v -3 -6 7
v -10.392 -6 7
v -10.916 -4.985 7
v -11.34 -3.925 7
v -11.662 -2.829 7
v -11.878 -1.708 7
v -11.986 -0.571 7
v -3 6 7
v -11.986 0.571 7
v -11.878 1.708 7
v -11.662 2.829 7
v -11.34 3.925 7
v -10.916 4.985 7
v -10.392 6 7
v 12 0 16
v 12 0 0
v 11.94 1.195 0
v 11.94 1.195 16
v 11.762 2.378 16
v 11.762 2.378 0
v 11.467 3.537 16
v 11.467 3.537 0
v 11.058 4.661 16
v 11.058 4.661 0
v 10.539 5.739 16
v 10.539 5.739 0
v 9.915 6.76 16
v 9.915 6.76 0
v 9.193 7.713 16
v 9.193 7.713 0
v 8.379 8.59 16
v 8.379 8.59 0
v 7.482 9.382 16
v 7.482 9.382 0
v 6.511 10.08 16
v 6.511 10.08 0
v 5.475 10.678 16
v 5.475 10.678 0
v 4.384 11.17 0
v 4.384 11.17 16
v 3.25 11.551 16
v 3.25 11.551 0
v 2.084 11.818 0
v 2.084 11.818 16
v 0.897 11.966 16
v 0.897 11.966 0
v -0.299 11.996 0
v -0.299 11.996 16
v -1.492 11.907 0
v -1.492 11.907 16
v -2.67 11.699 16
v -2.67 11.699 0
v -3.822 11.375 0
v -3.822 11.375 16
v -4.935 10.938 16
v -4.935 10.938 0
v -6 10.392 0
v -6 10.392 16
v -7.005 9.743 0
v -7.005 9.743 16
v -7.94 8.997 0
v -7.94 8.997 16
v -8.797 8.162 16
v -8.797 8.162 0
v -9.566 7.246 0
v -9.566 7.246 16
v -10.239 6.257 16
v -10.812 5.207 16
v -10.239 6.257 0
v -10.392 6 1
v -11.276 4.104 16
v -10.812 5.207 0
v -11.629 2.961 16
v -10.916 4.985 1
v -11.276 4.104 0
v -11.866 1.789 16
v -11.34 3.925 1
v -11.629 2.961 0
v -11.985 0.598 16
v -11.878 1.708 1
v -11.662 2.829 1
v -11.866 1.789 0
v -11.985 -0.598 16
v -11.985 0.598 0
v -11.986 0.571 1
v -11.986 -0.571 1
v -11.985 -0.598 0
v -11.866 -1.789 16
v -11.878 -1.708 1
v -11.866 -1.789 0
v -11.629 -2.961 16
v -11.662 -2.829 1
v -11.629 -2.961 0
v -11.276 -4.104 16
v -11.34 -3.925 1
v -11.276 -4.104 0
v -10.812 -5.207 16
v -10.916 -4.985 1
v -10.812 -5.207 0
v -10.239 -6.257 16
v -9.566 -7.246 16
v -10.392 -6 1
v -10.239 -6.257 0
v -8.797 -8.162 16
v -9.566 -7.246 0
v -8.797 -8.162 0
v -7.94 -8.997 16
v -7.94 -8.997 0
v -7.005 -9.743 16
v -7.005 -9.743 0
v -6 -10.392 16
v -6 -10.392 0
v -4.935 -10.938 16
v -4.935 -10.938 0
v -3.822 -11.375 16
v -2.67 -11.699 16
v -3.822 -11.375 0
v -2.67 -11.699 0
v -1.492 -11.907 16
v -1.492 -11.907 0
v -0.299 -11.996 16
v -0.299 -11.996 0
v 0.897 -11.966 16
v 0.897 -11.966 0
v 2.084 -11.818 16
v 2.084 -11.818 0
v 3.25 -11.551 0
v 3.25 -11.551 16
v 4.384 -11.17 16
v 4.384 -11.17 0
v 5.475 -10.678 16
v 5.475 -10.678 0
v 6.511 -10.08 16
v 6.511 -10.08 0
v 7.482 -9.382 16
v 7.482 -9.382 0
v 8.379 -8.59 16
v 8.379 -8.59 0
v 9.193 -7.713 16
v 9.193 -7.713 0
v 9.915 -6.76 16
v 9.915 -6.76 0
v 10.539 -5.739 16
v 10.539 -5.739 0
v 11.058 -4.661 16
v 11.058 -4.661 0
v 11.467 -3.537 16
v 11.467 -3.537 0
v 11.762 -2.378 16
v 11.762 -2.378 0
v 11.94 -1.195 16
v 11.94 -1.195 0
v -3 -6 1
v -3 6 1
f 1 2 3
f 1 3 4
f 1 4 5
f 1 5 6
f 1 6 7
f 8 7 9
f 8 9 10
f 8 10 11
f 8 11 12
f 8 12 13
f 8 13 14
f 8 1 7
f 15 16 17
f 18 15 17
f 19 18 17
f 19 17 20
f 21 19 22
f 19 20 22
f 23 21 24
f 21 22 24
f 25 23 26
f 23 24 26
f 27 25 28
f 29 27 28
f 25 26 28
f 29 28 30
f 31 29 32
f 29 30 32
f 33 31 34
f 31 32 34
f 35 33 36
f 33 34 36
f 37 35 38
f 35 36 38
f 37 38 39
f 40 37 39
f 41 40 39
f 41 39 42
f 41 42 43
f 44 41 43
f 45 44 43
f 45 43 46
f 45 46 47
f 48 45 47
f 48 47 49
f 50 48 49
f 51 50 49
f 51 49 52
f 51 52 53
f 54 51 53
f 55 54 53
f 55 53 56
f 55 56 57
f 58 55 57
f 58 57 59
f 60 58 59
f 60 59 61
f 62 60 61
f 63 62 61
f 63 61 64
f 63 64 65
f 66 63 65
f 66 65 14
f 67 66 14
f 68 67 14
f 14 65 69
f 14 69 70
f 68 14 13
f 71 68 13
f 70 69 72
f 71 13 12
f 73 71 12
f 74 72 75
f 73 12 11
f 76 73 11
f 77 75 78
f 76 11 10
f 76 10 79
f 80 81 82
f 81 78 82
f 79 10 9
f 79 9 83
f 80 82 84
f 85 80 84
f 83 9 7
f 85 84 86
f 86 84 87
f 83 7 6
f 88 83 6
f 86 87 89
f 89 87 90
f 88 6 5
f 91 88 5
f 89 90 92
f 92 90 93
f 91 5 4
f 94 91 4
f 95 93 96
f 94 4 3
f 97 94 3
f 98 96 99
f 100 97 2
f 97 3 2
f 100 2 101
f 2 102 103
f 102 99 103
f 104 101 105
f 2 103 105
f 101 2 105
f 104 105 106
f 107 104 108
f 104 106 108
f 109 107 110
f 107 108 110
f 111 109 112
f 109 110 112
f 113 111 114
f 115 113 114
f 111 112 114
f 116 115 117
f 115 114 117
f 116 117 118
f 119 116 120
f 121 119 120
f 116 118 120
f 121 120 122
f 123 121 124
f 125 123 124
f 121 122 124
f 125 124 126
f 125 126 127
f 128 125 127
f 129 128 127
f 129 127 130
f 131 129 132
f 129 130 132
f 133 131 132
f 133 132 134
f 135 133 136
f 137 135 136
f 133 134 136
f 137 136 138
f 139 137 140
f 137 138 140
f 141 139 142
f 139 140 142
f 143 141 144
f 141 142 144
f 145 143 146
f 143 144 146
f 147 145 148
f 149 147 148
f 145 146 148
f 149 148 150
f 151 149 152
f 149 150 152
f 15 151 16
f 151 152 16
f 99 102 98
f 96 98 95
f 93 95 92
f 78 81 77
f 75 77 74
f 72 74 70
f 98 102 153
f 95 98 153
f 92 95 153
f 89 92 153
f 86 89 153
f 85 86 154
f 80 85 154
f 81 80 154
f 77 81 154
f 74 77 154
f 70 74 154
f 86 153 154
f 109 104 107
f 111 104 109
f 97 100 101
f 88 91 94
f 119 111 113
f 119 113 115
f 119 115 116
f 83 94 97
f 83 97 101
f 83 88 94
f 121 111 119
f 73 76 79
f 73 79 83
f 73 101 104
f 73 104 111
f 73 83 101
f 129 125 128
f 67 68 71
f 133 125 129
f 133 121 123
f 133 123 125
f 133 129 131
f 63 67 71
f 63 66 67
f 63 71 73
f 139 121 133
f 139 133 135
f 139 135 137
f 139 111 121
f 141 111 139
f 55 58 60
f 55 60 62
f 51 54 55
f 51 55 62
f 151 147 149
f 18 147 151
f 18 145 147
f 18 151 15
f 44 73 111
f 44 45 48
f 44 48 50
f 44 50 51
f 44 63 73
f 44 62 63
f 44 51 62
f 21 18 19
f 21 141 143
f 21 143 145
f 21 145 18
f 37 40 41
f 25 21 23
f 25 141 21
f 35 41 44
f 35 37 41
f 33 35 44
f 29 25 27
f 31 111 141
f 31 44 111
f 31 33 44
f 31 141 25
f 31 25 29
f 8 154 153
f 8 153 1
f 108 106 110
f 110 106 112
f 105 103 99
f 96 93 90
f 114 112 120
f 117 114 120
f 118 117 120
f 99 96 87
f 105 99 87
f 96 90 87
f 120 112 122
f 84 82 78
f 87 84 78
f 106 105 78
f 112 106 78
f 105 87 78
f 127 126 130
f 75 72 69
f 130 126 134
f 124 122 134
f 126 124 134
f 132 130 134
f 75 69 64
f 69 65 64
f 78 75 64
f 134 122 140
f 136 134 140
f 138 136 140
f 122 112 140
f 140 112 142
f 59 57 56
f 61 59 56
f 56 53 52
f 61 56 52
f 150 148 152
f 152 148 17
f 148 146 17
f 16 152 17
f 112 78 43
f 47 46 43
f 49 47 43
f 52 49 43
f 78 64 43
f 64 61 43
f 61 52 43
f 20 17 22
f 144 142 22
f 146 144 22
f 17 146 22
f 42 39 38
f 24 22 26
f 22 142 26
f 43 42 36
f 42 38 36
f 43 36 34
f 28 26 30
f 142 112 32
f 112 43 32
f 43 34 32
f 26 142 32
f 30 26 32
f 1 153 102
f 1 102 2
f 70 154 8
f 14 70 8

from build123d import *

# Parameters (mm, degrees)
CROQUIS1_R                 = 12
SALIENTE_EXTRUIR1_DEPTH    = 16
CORTAR_EXTRUIR1_DEPTH      = 1
CORTAR_EXTRUIR1_DEPTH_BACK = 9
CROQUIS3_W                 = 6
CROQUIS3_H                 = 12


with BuildPart() as part:
    # Croquis1 → Saliente-Extruir1 (new body)
    with BuildSketch(Plane.XY):
        Circle(CROQUIS1_R)
    extrude(amount=SALIENTE_EXTRUIR1_DEPTH)

    # Croquis3 → Cortar-Extruir1 (cut, two sides: drawn at the far end of the back side and taken through both)
    with BuildSketch(Plane.ZY.offset(12).offset(-CORTAR_EXTRUIR1_DEPTH_BACK)):
        with Locations((4, 0)):
            Rectangle(CROQUIS3_W, CROQUIS3_H)
    extrude(amount=CORTAR_EXTRUIR1_DEPTH + CORTAR_EXTRUIR1_DEPTH_BACK, mode=Mode.SUBTRACT)


solid = part.part
